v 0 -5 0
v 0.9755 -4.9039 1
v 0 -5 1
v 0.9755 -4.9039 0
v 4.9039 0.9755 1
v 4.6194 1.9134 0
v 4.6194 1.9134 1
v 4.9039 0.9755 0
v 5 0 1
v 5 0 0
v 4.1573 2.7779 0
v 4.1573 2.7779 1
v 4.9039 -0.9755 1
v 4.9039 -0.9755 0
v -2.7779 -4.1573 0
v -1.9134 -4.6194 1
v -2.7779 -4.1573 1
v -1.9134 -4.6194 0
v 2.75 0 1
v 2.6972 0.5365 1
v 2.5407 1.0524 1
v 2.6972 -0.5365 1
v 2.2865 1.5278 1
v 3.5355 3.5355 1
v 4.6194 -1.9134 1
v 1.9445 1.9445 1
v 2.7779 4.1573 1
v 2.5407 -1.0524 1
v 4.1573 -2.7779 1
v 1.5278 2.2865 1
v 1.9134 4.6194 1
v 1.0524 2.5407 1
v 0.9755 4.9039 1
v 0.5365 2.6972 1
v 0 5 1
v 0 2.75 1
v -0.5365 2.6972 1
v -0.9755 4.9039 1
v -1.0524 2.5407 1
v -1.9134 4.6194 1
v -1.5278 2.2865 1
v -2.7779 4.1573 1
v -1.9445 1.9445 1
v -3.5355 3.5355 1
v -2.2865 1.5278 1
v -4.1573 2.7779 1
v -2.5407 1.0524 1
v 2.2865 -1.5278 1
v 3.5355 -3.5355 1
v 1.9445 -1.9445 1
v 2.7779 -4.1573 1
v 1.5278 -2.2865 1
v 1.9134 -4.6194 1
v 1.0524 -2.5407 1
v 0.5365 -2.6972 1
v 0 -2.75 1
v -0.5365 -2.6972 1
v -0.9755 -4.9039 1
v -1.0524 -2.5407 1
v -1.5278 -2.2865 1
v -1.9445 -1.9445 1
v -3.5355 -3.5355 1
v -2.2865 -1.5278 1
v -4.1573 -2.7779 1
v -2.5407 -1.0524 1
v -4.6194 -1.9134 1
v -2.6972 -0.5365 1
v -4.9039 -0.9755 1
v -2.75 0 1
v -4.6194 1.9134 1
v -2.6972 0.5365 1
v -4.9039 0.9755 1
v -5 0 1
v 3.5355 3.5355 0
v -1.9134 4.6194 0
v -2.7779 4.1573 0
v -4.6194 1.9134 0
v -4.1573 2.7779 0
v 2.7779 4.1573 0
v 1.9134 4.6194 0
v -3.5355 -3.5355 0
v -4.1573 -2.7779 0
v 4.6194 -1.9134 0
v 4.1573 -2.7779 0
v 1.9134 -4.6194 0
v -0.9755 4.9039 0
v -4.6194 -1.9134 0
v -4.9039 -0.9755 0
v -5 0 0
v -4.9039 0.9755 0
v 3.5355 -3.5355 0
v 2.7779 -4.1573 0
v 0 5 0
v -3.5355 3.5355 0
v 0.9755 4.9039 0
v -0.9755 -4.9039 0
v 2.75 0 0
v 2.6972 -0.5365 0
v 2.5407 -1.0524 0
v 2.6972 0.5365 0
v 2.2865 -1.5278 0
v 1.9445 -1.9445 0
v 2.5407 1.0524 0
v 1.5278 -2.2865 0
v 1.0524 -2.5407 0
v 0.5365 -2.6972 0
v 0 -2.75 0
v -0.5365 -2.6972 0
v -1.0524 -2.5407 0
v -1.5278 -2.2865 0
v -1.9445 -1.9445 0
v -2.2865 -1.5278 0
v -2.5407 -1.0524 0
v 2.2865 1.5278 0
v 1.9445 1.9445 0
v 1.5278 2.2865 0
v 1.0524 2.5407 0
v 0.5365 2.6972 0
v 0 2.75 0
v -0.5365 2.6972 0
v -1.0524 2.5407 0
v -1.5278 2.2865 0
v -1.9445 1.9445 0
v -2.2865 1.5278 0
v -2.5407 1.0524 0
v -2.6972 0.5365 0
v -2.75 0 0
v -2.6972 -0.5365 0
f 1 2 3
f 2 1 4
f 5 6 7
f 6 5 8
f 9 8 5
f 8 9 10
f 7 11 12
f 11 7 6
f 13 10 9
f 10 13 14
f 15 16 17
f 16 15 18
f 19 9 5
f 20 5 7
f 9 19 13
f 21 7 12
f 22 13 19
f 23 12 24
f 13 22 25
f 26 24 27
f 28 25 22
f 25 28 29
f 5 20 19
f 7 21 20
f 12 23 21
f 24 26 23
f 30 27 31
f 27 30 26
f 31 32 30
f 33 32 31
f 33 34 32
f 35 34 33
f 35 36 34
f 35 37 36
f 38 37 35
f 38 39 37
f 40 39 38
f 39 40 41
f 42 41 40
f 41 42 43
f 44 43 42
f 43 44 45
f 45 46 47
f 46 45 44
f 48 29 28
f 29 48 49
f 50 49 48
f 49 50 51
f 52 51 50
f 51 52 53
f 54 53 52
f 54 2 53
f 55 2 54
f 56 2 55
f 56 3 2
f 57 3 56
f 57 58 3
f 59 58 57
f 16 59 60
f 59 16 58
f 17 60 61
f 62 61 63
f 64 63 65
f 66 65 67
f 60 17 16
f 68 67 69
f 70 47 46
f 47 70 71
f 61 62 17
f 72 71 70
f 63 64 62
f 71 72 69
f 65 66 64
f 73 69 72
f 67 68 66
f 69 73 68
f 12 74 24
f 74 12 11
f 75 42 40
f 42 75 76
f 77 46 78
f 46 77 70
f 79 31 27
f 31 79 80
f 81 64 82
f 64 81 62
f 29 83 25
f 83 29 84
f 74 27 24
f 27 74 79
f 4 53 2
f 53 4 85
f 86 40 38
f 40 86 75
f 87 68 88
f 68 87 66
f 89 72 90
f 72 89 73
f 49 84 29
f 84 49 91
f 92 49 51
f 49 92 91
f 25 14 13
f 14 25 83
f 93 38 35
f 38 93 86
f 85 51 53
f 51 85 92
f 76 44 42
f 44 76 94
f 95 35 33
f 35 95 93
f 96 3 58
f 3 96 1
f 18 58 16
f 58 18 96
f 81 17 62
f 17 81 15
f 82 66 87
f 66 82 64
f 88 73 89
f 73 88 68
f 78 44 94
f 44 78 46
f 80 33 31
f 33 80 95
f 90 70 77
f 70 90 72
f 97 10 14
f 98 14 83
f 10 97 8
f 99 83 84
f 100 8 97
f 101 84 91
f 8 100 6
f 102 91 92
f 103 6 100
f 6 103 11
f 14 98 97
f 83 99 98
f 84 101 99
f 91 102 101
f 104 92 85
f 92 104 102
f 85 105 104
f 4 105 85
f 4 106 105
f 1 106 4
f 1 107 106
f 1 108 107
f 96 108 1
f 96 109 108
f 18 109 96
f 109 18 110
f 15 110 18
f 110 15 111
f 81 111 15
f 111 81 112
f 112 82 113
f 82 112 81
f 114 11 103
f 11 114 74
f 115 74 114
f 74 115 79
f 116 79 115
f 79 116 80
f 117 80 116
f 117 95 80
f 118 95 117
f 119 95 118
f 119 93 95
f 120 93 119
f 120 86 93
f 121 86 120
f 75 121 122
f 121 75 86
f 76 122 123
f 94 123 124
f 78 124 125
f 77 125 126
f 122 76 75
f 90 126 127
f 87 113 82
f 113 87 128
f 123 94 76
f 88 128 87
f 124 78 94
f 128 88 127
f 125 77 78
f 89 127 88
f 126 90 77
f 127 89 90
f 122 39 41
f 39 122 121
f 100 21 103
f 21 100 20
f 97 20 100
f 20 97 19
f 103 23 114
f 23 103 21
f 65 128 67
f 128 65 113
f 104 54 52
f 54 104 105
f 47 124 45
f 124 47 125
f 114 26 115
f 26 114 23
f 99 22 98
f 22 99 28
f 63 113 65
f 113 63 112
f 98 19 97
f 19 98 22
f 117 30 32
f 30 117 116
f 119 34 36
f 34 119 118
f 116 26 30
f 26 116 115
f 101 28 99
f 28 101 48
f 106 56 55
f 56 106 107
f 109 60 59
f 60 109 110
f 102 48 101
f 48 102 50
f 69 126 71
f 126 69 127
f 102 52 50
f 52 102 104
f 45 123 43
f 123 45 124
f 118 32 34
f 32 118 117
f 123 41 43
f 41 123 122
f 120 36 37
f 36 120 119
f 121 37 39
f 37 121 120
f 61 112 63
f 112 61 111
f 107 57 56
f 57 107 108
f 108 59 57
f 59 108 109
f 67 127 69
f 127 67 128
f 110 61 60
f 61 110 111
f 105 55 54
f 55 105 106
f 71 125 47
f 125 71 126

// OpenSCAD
// Purchased hardware envelope; no modeled threads, not print.
$fn=32;
difference(){cylinder(d=10,h=1);translate([0,0,-1])cylinder(d=5.5,h=3);}
